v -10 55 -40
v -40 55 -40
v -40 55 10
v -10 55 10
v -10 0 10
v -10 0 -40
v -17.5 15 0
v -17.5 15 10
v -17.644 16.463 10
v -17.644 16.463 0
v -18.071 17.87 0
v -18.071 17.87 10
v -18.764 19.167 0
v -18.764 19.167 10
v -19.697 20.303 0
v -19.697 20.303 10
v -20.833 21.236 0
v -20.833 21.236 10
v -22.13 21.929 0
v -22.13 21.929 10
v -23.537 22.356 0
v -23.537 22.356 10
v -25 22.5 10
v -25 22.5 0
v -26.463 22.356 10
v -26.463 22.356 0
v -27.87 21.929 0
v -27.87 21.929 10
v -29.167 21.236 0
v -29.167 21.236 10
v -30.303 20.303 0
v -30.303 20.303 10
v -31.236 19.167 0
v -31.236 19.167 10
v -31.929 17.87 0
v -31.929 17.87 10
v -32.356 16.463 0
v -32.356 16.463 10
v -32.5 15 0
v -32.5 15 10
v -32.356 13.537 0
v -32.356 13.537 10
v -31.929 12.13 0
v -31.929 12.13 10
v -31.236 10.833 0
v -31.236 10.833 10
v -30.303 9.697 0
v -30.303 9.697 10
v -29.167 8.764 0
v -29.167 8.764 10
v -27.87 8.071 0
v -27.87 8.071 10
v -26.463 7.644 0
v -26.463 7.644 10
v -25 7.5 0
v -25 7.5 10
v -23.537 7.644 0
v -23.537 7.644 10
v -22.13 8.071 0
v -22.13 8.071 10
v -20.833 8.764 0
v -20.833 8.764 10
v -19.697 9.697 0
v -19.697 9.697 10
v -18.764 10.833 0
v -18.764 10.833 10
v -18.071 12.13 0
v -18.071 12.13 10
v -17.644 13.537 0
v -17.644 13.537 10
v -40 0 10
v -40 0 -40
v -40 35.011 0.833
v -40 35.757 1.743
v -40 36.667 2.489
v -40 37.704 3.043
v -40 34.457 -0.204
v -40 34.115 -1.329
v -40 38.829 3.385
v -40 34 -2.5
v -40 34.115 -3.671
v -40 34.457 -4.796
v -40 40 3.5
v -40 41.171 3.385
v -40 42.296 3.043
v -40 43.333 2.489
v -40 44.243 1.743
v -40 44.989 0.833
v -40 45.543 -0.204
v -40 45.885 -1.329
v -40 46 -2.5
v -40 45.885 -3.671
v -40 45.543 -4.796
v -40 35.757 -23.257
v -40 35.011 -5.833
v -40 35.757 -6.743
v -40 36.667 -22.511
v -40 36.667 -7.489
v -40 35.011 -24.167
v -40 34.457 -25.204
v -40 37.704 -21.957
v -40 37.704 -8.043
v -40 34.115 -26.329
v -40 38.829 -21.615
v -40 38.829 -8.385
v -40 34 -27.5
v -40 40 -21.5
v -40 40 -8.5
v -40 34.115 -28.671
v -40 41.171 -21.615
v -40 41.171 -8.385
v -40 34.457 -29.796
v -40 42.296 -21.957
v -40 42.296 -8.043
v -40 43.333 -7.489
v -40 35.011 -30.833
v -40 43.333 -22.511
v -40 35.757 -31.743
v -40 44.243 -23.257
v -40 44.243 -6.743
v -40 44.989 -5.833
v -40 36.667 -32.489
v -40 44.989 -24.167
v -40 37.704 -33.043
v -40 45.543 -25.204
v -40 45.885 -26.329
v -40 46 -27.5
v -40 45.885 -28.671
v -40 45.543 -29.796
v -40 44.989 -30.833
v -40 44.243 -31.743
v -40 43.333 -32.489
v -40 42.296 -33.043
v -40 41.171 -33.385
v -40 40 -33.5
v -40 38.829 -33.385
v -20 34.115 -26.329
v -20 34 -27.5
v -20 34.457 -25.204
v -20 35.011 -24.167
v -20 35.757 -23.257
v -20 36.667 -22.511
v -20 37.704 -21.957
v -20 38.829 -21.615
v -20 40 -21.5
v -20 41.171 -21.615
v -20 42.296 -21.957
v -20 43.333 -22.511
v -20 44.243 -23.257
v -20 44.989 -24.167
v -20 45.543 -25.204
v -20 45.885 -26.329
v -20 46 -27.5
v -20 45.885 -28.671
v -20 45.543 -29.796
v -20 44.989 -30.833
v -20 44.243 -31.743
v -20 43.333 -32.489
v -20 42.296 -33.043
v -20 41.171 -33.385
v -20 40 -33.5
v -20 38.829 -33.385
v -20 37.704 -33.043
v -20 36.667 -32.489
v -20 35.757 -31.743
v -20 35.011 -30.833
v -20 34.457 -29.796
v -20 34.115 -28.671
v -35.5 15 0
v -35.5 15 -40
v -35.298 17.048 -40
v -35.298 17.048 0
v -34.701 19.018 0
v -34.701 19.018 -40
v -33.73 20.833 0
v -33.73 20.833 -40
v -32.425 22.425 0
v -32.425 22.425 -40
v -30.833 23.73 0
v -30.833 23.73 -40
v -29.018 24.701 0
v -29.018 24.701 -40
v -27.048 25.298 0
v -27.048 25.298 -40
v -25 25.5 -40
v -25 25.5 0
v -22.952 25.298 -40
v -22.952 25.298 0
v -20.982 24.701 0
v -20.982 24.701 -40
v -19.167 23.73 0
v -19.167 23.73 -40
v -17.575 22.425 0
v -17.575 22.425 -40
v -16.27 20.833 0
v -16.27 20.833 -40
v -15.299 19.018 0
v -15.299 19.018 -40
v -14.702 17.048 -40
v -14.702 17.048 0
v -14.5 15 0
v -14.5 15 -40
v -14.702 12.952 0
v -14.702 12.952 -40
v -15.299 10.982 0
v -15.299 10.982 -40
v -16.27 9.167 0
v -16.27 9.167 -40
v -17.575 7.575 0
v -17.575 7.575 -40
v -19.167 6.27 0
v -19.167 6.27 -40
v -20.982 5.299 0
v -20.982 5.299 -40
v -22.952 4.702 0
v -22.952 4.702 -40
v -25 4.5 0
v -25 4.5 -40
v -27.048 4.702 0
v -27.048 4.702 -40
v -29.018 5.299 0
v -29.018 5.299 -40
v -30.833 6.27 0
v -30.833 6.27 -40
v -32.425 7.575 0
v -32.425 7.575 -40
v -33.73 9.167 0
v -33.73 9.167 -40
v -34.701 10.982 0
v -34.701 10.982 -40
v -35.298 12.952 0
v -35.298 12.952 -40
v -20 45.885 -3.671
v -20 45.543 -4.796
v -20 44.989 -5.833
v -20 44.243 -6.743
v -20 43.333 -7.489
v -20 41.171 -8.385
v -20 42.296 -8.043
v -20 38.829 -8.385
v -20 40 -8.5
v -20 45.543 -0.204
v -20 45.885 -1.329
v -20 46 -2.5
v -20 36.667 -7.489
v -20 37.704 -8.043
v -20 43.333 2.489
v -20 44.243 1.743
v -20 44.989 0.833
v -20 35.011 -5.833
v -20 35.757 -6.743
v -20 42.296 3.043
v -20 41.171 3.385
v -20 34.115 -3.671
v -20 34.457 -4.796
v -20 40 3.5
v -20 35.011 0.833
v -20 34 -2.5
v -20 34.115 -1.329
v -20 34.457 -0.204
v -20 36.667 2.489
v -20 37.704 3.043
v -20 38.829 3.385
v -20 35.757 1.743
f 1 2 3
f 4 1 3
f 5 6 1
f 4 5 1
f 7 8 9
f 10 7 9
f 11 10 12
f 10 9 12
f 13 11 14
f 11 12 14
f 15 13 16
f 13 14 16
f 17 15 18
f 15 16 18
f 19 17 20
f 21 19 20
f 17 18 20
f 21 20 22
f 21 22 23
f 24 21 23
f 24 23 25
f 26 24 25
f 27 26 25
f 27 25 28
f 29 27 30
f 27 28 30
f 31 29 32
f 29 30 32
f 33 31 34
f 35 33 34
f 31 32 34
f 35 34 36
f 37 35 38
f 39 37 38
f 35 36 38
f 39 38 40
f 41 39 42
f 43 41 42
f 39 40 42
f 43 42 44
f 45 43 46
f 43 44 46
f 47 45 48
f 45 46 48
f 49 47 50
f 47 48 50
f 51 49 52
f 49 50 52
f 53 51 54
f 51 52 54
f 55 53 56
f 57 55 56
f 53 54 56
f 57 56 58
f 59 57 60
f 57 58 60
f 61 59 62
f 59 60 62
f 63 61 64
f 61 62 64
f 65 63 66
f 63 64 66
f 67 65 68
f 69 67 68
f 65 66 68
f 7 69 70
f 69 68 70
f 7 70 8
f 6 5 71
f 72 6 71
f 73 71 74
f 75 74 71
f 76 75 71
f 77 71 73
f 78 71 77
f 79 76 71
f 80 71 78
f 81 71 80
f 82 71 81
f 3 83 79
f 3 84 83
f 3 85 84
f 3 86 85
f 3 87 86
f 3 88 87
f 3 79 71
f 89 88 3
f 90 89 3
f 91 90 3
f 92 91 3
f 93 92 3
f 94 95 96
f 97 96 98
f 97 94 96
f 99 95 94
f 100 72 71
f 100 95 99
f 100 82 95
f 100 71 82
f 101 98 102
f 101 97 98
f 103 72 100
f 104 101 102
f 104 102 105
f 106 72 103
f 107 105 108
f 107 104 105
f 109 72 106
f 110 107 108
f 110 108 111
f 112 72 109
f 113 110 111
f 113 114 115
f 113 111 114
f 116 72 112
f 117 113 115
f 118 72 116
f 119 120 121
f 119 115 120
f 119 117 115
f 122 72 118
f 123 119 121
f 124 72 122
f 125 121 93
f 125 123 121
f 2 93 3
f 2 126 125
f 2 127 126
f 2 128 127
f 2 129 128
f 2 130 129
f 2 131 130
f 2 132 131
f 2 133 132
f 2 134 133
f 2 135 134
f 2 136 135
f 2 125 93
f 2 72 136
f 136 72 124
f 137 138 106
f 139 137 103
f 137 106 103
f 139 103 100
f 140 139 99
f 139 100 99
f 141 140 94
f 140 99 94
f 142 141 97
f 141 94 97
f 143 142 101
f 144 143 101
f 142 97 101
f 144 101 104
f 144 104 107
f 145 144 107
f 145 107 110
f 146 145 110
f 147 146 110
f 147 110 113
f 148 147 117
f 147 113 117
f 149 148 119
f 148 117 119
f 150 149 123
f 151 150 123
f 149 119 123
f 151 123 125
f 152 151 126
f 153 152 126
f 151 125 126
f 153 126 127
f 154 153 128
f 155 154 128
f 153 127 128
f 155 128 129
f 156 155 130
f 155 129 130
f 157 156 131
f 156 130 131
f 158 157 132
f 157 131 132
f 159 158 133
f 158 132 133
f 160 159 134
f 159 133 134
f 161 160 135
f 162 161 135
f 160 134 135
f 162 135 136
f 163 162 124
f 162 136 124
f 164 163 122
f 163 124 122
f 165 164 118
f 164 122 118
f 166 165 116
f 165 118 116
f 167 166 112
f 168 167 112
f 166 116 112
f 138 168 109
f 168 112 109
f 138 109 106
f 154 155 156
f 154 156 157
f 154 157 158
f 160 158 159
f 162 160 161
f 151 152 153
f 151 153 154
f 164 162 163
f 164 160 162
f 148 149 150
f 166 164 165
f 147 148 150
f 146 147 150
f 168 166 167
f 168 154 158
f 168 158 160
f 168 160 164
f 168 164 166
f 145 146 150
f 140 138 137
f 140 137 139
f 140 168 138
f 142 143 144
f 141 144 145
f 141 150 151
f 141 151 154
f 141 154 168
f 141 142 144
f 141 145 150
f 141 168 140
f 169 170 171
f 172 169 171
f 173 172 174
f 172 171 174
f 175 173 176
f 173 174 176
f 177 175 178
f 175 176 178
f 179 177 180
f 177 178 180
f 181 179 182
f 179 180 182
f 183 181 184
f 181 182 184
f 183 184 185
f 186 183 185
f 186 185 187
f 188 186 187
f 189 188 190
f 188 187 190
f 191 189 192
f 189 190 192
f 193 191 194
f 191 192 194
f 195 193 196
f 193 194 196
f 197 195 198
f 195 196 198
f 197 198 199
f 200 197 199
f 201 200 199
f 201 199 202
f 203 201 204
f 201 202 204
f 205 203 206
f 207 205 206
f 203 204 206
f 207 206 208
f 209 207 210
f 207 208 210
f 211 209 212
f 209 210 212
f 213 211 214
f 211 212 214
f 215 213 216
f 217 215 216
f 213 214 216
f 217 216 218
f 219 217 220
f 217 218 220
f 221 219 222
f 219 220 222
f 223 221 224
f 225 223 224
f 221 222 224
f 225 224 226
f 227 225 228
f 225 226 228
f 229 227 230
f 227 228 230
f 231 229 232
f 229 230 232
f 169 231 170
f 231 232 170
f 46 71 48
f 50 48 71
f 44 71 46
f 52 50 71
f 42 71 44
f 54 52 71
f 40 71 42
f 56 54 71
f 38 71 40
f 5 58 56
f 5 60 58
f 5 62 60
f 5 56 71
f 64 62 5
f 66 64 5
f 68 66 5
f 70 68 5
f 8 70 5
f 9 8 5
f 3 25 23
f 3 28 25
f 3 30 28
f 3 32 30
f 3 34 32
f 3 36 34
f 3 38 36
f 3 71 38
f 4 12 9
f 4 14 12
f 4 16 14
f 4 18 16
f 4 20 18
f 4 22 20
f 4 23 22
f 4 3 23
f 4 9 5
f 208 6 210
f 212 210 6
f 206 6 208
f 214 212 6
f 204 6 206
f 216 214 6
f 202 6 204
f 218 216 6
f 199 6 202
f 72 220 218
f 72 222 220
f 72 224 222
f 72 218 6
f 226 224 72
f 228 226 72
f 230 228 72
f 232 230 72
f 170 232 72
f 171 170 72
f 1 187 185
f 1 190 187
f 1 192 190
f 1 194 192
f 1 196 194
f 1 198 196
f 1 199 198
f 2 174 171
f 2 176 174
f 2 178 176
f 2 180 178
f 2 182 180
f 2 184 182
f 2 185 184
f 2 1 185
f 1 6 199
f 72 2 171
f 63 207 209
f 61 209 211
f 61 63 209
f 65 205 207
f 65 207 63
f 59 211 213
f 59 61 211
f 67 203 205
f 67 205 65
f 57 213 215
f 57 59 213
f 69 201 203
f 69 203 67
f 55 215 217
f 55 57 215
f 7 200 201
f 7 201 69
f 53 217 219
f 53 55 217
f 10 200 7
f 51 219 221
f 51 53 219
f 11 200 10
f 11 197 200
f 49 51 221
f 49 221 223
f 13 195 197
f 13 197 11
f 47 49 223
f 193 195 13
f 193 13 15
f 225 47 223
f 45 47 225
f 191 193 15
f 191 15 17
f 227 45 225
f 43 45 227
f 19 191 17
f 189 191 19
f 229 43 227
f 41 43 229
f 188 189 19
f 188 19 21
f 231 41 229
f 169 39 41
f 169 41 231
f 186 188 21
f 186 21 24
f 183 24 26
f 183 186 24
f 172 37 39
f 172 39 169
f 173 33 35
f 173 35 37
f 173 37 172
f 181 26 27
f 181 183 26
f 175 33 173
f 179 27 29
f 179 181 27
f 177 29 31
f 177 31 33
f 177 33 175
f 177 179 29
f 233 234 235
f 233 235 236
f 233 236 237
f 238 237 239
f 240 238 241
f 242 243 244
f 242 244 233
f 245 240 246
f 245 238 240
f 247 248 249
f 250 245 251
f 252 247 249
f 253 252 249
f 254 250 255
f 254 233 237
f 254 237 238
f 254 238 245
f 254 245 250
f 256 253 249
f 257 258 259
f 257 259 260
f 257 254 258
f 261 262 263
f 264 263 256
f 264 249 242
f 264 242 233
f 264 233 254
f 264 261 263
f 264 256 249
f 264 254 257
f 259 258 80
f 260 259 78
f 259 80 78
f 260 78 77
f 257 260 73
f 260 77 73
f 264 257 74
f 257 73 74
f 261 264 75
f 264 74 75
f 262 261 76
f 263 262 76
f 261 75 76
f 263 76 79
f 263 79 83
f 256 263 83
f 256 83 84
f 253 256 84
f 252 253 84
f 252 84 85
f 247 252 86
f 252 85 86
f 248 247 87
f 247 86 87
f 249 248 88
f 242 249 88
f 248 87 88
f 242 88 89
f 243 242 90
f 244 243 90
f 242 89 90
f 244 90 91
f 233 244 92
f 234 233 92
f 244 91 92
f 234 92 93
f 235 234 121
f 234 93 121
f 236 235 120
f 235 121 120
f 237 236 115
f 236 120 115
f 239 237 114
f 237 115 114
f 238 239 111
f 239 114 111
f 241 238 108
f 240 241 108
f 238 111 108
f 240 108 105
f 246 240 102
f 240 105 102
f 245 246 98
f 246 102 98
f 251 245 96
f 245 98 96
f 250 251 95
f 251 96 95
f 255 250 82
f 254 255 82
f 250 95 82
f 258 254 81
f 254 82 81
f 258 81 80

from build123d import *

# Parameters (mm, degrees)
SKETCH1_W           = 50
SKETCH1_H           = 70
BOSS_EXTRUDE1_DEPTH = 10
SKETCH2_R           = 7.5
CUT_EXTRUDE1_DEPTH  = 10
SKETCH3_W           = 50
SKETCH3_H           = 70
BOSS_EXTRUDE2_DEPTH = 40
SKETCH4_R           = 10.5
CUT_EXTRUDE3_DEPTH  = 40
SKETCH5_W           = 10
SKETCH5_H           = 70
CUT_EXTRUDE4_DEPTH  = 50
SKETCH6_R           = 6
CUT_EXTRUDE5_DEPTH  = 20
SKETCH7_W           = 50
SKETCH7_H           = 15
CUT_EXTRUDE6_DEPTH  = 30


with BuildPart() as part:
    # Sketch1 → Boss-Extrude1 (new body)
    with BuildSketch(Plane.XY):
        with Locations((-25, 35)):
            Rectangle(SKETCH1_W, SKETCH1_H)
    extrude(amount=BOSS_EXTRUDE1_DEPTH)

    # Sketch2 → Cut-Extrude1 (cut)
    with BuildSketch(Plane.XY.offset(10)):
        with Locations((-25, 15)):
            Circle(SKETCH2_R)
    extrude(amount=-CUT_EXTRUDE1_DEPTH, mode=Mode.SUBTRACT)

    # Sketch3 → Boss-Extrude2 (add)
    with BuildSketch(Plane(origin=(0, 0, 0), x_dir=(-1, 0, 0), z_dir=(0, 0, -1))):
        with Locations((25, 35)):
            Rectangle(SKETCH3_W, SKETCH3_H)
    extrude(amount=BOSS_EXTRUDE2_DEPTH)

    # Sketch4 → Cut-Extrude3 (cut)
    with BuildSketch(Plane(origin=(0, 0, -40), x_dir=(-1, 0, 0), z_dir=(0, 0, -1))):
        with Locations((25, 15)):
            Circle(SKETCH4_R)
    extrude(amount=-CUT_EXTRUDE3_DEPTH, mode=Mode.SUBTRACT)

    # Sketch5 → Cut-Extrude4 (cut)
    with BuildSketch(Plane(origin=(0, 0, -40), x_dir=(-1, 0, 0), z_dir=(0, 0, -1))):
        with Locations((5, 35)):
            Rectangle(SKETCH5_W, SKETCH5_H)
        with Locations((45, 35)):
            Rectangle(SKETCH5_W, SKETCH5_H)
    extrude(amount=-CUT_EXTRUDE4_DEPTH, mode=Mode.SUBTRACT)

    # Sketch6 → Cut-Extrude5 (cut)
    with BuildSketch(Plane.ZY.offset(40)):
        with Locations(Location((-27.5, 40, 0), (0, 0, 270))):
            Circle(SKETCH6_R)
        with Locations(Location((-2.5, 40, 0), (0, 0, 270))):
            Circle(SKETCH6_R)
    extrude(amount=-CUT_EXTRUDE5_DEPTH, mode=Mode.SUBTRACT)

    # Sketch7 → Cut-Extrude6 (cut)
    with BuildSketch(Plane.ZY.offset(40)):
        with Locations((-15, 62.5)):
            Rectangle(SKETCH7_W, SKETCH7_H)
    extrude(amount=-CUT_EXTRUDE6_DEPTH, mode=Mode.SUBTRACT)


solid = part.part
